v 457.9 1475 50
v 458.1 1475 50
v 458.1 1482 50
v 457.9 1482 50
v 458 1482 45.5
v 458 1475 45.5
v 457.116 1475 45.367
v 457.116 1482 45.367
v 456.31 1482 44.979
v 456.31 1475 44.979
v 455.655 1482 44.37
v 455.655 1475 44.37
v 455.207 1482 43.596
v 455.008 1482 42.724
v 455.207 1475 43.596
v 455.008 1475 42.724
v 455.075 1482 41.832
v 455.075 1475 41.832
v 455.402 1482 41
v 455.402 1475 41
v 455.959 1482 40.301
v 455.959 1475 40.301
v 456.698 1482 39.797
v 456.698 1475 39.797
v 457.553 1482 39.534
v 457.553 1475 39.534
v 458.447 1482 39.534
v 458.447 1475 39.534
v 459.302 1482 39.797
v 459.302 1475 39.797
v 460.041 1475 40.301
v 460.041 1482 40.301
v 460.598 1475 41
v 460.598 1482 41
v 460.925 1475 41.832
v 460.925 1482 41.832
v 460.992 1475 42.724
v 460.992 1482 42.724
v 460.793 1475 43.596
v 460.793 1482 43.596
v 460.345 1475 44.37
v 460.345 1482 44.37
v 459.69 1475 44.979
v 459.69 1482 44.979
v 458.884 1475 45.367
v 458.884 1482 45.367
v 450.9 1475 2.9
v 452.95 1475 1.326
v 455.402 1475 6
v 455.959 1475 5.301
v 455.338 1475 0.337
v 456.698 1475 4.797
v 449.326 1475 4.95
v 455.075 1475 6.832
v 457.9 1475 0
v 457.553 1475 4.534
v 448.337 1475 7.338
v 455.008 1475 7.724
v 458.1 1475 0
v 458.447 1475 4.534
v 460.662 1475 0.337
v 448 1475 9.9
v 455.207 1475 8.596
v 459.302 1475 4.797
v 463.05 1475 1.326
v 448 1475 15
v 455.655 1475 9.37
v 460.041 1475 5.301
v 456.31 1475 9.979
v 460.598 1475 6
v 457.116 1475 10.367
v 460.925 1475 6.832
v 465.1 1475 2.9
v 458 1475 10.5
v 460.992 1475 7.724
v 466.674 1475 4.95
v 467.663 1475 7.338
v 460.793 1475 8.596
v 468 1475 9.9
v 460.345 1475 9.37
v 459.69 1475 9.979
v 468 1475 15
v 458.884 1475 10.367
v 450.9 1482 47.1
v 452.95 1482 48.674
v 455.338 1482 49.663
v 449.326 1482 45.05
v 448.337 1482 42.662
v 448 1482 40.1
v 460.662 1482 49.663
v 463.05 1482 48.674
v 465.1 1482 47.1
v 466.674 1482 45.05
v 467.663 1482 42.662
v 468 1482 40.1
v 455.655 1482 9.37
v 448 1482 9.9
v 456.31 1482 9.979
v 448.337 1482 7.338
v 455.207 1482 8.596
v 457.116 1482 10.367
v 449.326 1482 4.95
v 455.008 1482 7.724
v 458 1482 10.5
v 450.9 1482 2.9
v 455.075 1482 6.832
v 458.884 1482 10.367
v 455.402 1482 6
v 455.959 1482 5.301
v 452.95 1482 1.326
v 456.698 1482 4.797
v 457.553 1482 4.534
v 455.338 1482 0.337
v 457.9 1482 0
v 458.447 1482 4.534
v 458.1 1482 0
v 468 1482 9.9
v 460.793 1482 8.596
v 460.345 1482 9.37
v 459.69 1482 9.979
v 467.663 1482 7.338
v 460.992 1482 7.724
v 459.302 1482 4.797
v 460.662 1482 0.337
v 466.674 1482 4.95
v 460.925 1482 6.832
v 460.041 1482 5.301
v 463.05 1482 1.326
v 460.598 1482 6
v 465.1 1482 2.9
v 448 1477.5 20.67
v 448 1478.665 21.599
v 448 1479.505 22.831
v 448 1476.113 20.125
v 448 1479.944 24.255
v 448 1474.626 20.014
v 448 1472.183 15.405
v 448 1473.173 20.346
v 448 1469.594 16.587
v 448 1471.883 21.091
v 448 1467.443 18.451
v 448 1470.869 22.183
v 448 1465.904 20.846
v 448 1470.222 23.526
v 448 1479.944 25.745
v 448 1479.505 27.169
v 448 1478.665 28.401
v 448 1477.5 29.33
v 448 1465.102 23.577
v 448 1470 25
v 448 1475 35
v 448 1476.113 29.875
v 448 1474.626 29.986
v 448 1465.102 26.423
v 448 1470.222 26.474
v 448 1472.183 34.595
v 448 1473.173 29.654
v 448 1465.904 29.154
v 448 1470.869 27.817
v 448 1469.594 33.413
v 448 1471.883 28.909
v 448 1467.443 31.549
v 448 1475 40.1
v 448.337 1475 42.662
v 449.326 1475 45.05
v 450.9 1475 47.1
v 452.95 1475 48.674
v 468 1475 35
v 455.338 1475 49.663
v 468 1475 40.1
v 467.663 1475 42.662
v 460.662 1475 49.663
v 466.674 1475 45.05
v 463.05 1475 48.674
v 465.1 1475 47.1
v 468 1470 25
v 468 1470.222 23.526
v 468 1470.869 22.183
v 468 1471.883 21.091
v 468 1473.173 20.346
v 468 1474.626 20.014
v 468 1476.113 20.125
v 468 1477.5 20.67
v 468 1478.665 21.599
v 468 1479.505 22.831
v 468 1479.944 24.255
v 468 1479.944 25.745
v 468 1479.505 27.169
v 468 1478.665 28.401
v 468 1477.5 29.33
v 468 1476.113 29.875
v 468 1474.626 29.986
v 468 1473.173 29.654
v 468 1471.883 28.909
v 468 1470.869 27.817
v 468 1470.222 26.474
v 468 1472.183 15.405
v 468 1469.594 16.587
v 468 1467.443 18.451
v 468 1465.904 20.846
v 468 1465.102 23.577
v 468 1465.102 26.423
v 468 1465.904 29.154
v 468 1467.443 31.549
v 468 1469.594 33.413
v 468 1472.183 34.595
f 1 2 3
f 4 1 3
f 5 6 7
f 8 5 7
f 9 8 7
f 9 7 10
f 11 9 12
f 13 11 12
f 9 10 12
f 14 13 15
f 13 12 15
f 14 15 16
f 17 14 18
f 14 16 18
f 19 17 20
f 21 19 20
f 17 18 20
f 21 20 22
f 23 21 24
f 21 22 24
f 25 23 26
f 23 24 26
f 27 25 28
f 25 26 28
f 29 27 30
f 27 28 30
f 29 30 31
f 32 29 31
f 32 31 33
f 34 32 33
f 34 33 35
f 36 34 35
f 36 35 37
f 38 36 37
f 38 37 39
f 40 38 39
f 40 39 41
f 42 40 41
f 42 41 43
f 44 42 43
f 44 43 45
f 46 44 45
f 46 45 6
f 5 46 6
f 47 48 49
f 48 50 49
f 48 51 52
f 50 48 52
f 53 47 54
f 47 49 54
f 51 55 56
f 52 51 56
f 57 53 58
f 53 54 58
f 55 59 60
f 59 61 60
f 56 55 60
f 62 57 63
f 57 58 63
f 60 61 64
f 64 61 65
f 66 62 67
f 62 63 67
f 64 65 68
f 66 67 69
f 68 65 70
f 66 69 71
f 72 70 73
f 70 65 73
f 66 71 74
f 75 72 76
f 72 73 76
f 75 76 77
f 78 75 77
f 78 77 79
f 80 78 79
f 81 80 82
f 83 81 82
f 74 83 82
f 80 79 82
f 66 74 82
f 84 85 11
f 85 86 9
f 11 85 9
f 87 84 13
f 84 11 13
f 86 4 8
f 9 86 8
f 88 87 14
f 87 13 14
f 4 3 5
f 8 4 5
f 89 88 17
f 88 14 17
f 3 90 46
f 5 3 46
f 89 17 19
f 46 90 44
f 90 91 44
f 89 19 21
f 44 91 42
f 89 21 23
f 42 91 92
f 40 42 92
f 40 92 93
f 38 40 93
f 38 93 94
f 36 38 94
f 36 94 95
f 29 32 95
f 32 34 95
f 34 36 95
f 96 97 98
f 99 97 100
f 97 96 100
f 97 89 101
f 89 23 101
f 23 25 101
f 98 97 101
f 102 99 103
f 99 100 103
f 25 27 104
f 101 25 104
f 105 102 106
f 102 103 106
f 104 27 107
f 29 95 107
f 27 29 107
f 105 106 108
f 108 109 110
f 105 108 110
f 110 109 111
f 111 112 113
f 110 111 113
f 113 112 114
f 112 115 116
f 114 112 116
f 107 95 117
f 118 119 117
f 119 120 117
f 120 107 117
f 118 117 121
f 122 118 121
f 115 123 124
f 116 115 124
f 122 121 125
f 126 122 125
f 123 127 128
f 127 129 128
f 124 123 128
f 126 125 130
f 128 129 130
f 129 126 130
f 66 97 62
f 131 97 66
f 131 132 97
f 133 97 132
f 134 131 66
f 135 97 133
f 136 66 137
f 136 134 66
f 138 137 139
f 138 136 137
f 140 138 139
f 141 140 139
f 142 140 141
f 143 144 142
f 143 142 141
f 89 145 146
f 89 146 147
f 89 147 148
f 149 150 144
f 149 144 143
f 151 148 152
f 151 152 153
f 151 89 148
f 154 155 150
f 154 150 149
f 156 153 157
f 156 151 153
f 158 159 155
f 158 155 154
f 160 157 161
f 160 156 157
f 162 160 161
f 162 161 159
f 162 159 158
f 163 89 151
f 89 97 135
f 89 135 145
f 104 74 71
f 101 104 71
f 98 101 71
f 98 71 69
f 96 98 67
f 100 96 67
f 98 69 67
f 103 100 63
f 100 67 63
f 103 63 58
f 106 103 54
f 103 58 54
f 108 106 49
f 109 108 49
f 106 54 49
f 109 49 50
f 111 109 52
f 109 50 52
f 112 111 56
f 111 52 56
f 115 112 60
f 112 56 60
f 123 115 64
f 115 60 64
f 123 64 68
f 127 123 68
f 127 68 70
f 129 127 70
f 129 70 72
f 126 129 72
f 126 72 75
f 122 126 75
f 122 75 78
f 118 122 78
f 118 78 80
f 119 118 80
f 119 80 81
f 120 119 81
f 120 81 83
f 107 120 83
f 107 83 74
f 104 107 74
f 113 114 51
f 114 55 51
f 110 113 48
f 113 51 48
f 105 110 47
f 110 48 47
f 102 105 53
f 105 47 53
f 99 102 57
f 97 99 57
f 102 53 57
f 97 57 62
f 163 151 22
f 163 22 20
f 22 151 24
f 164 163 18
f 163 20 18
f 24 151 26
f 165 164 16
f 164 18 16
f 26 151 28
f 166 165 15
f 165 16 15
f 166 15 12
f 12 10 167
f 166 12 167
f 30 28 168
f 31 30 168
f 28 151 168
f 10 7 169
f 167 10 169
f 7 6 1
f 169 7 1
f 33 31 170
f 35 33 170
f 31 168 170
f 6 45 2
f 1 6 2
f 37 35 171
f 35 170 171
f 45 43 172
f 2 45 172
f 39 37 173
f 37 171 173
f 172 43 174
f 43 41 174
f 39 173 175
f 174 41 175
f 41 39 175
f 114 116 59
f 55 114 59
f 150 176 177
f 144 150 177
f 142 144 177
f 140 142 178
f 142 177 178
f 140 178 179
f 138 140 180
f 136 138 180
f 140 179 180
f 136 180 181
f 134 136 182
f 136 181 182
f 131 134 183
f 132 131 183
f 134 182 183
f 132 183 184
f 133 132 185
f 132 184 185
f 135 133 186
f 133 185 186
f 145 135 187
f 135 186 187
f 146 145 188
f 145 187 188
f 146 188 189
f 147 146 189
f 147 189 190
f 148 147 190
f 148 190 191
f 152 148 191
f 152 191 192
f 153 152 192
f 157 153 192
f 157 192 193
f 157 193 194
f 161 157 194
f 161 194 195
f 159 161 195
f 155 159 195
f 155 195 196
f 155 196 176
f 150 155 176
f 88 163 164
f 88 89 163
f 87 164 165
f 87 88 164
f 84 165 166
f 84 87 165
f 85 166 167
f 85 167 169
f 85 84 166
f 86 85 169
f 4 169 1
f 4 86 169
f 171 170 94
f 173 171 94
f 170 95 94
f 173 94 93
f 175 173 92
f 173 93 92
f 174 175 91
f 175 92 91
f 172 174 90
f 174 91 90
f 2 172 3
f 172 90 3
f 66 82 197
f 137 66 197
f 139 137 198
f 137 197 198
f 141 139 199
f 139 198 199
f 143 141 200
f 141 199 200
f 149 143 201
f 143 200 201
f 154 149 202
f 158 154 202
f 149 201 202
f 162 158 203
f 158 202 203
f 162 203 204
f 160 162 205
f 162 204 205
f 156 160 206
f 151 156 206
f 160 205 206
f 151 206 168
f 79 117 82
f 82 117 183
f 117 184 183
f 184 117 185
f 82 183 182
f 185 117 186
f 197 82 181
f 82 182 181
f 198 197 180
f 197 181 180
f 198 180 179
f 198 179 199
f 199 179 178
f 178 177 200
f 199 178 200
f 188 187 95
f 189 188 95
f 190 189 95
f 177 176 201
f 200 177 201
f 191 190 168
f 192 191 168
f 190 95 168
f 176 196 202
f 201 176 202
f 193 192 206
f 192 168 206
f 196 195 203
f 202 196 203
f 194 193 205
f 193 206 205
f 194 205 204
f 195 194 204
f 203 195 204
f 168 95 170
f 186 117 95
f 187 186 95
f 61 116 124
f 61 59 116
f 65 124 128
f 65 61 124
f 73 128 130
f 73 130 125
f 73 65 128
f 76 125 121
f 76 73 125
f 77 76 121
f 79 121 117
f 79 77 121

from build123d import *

# Parameters (mm, degrees)
PAD030_DEPTH             = 20
SKETCH021_R              = 5
POCKET001006_DEPTH       = 20.001
FILLET_R                 = 9.9
SKETCH024_R              = 3
POCKET002_DEPTH          = 7.001
CLONE076_ROLL_ANGLE      = 90
CLONE076_PLACEMENT_ANGLE = -90


with BuildPart() as part:
    # Sketch020 → Pad030 (new body)
    with BuildSketch(Plane.XY):
        with BuildLine():
            Line((18, 0), (25, 0))
            Line((25, 0), (25, 15))
            ThreePointArc((25, 15), (35, 25), (25, 35))
            Line((25, 35), (25, 50))
            Line((25, 50), (18, 50))
            Line((18, 50), (18, 0))
        make_face()
    extrude(amount=PAD030_DEPTH)

    # Sketch021 → Pocket001006 (cut, through all)
    with BuildSketch(Plane(origin=(0, 0, 0), x_dir=(1, 0, 0), z_dir=(0, 0, -1))):
        with Locations((25, -25)):
            Circle(SKETCH021_R)
    extrude(amount=-POCKET001006_DEPTH, mode=Mode.SUBTRACT)

    # Fillet
    fillet_edges = [part.edges().sort_by_distance(p)[0] for p in [
        (21.5, 0, 0),
        (21.5, 50, 0),
        (21.5, 50, 20),
        (21.5, 0, 20),
    ]]
    fillet(fillet_edges, radius=FILLET_R)

    # Sketch024 → Pocket002 (cut, through all)
    with BuildSketch(Plane.YZ.offset(25)):
        with Locations((7.5, 10)):
            Circle(SKETCH024_R)
        with Locations((42.5, 10)):
            Circle(SKETCH024_R)
    extrude(amount=-POCKET002_DEPTH, mode=Mode.SUBTRACT)


with BuildPart() as part_1:
    # Clone076 roll: moved
    add(part.part.rotate(Axis((0, 0, 0), (1, 0, 0)), CLONE076_ROLL_ANGLE))


with BuildPart() as part_2:
    # Clone076 placement: moved
    add(part_1.part.moved(Location((120.75, 1500, 0))).rotate(Axis((120.75, 1500, 0), (0, 0, 1)), CLONE076_PLACEMENT_ANGLE))


with BuildPart() as part_3:
    # Clone078 placement: moved
    add(part_2.part.moved(Location((347.25, 0, 0))))


solid = part_3.part
